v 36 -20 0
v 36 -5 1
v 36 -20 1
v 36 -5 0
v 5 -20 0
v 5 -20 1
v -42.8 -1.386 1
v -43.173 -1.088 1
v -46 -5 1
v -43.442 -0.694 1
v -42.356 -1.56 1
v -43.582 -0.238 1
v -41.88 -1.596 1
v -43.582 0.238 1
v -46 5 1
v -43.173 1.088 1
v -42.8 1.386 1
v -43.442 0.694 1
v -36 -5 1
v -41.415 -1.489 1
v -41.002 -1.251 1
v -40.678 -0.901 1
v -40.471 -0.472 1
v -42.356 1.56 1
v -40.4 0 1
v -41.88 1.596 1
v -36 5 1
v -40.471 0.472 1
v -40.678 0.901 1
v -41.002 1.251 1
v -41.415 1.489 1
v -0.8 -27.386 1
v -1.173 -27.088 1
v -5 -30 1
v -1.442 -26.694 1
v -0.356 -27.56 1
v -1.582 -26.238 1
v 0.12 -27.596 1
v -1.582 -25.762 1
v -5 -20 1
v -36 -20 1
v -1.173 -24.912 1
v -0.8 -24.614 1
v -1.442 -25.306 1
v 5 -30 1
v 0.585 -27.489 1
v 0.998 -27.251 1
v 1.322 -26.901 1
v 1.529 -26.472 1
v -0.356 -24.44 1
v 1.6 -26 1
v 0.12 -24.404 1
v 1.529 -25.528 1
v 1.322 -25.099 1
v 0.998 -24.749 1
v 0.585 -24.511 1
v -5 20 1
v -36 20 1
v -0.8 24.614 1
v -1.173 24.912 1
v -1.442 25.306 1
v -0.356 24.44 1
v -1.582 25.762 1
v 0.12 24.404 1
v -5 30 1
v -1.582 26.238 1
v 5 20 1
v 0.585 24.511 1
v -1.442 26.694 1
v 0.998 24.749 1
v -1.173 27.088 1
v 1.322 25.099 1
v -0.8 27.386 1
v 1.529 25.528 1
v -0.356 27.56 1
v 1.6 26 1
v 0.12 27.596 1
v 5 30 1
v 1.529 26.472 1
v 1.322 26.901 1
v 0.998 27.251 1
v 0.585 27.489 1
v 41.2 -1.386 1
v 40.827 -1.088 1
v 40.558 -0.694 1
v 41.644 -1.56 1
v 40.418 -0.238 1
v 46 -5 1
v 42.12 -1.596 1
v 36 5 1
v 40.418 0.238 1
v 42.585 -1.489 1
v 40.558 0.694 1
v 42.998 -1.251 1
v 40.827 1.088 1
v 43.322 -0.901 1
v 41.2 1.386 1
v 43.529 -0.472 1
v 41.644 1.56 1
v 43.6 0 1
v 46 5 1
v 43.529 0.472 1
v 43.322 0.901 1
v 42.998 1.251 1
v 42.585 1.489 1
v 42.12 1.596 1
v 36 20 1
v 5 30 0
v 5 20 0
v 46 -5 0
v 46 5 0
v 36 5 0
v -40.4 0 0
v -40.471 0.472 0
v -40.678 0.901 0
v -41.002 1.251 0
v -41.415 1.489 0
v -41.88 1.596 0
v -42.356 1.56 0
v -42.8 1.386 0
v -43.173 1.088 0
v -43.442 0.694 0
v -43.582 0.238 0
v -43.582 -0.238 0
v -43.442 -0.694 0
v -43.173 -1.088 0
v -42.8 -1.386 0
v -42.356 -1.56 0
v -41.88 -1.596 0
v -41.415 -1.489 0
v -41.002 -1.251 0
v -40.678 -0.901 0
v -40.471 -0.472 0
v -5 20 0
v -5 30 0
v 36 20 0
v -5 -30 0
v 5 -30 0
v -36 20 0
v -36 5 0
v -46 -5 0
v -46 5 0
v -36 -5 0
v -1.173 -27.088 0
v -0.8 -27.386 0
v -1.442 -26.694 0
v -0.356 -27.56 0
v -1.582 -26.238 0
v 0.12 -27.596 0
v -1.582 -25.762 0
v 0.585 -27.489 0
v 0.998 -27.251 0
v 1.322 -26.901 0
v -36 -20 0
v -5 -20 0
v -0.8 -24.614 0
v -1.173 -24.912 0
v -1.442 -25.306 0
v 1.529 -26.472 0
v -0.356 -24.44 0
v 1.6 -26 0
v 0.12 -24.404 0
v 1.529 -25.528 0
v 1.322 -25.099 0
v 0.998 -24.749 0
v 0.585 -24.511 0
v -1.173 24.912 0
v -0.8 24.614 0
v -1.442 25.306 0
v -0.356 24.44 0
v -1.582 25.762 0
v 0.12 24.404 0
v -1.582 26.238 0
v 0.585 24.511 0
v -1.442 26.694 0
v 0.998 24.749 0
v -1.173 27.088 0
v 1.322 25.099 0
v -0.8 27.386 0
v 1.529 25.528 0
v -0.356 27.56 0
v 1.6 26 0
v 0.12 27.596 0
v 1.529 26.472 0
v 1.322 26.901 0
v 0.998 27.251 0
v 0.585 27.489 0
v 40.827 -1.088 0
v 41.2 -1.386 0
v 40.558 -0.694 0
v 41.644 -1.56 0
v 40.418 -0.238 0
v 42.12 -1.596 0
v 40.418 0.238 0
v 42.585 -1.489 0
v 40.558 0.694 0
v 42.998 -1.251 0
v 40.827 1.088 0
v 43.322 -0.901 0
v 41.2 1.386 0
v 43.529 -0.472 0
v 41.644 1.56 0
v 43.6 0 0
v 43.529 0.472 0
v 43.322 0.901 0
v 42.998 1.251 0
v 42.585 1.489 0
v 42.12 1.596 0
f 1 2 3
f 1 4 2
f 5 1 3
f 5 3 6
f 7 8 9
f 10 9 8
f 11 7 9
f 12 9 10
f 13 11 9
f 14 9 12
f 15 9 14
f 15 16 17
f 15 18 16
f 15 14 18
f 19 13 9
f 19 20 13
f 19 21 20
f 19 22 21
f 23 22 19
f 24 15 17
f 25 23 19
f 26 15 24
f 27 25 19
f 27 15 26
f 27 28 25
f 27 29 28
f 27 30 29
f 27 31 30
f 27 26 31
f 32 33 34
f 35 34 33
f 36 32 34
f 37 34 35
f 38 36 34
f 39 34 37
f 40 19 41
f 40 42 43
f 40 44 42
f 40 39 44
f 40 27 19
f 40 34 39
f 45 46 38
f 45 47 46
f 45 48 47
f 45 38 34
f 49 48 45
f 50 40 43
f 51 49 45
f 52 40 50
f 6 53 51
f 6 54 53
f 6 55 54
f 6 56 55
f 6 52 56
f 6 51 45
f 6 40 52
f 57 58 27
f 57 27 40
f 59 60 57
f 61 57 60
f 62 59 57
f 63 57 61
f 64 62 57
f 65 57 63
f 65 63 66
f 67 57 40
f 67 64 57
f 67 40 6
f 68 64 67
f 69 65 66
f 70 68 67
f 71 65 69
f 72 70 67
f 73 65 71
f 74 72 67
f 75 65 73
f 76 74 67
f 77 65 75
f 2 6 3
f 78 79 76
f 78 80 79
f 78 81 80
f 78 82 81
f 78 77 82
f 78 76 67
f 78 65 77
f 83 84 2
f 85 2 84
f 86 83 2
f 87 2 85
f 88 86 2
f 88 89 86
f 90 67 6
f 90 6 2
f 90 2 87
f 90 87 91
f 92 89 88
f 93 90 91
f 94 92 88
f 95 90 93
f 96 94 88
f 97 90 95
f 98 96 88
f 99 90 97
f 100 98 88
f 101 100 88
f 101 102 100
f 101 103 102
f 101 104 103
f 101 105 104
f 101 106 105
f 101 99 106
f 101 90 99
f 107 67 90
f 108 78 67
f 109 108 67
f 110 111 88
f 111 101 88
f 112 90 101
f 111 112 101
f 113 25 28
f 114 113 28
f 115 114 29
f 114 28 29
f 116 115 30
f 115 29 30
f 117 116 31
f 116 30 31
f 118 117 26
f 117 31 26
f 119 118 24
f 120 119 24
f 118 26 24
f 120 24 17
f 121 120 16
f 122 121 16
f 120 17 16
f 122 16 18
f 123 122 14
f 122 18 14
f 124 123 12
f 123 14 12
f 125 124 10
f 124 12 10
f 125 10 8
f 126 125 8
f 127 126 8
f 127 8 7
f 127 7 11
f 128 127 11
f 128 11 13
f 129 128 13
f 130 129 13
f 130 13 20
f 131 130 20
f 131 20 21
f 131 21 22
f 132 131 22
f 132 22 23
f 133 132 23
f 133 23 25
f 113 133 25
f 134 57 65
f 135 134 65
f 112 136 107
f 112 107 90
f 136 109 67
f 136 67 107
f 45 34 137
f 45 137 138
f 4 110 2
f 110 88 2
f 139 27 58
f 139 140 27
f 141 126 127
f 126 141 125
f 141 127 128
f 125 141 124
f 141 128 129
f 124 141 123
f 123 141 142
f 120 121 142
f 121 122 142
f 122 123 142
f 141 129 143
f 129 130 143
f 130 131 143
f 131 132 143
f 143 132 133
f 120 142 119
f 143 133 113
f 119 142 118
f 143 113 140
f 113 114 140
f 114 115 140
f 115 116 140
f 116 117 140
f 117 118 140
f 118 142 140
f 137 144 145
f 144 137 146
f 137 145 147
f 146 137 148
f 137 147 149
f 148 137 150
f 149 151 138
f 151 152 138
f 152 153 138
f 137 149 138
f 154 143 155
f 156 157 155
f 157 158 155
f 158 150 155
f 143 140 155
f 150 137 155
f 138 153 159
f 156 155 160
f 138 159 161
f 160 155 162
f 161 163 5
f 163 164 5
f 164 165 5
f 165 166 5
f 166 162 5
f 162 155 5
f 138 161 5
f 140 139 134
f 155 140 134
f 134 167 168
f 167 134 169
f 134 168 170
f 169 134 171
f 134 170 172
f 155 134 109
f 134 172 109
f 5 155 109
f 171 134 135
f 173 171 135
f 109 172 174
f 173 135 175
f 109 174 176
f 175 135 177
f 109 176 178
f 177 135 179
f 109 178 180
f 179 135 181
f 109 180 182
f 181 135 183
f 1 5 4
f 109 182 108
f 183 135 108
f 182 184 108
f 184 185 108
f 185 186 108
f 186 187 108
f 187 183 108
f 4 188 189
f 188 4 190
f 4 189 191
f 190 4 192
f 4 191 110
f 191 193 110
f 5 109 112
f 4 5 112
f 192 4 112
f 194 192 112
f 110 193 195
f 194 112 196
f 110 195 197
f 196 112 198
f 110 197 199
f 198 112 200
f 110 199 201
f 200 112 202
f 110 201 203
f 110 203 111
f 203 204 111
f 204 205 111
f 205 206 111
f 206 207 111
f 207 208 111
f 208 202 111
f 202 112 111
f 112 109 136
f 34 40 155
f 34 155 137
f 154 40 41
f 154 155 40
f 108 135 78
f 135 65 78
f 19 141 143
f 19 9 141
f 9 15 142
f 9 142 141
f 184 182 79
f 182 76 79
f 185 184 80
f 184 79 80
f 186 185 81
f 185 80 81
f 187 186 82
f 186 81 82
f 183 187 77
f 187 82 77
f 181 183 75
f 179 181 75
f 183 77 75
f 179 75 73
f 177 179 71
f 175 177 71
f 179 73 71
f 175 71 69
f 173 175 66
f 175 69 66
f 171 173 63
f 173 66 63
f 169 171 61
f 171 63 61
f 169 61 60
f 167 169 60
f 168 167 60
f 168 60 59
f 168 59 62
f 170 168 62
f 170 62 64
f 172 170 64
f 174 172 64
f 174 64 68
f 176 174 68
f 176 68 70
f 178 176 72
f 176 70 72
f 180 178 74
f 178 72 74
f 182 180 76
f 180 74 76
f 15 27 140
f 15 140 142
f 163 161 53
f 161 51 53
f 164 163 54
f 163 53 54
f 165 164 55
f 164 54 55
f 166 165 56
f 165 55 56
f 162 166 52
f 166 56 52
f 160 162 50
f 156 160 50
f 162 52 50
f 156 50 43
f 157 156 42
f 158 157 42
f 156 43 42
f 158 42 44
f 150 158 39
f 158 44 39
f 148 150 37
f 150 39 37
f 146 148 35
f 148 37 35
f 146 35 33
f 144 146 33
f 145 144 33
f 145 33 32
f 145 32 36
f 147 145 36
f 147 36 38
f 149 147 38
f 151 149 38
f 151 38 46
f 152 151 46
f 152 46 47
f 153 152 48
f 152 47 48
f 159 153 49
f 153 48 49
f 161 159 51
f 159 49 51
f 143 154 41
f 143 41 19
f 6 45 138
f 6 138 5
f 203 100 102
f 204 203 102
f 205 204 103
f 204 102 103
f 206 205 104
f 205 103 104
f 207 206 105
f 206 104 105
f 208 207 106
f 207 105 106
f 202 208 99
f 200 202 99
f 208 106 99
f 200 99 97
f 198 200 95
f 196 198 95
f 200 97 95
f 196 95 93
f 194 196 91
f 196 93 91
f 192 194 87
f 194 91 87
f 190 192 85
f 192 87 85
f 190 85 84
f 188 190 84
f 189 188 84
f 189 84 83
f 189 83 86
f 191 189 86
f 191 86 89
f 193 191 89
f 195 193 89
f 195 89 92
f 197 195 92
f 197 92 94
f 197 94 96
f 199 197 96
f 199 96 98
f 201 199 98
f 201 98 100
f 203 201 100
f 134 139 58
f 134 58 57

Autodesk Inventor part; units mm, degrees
ref_plane "YZ Plane" through (0, 0, 0) normal (1, 0, 0) x (0, 1, 0)
ref_plane "XZ Plane" through (0, 0, 0) normal (0, 1, 0) x (-1, 0, 0)
ref_plane "XY Plane" through (0, 0, 0) normal (0, 0, 1) x (1, 0, 0)
sketch "Sketch1" plane through (0, 0, 0) normal (0, 0, 1) x (1, 0, 0)
  line L0 (-36, 20) -> (36, 20)
  line L1 (36, 20) -> (36, -20)
  line L2 (36, -20) -> (-36, -20)
  line L3 (-36, -20) -> (-36, 20)
  line L4 (-36, 20) -> (36, -20) construction
  line L5 (36, 20) -> (-36, -20) construction
  point P0 (0, 0)
  dimension "d0" = 40
  dimension "d1" = 72
sketch "Sketch2" plane through (0, 0, 1) normal (0, 0, 1) x (1, 0, 0)
  line L0 (-36, 20) -> (36, 20)
  line L1 (-46, -5) -> (-36, -5)
  line L2 (-36, -5) -> (-36, 5)
  line L3 (-36, 5) -> (-46, 5)
  line L4 (-46, 5) -> (-46, -5)
  line L5 (-46, -5) -> (-36, 5) construction
  line L6 (-36, -5) -> (-46, 5) construction
  line L7 (0, 0) -> (0, 7.0571)
  line L8 (0, 0) -> (6.6312, 0)
  line L9 (-36, -20) -> (-36, 20)
  line L10 (46, -5) -> (36, -5)
  line L11 (36, -5) -> (36, 5)
  line L12 (36, 5) -> (46, 5)
  line L13 (46, 5) -> (46, -5)
  line L14 (46, -5) -> (36, 5) construction
  line L15 (36, -5) -> (46, 5) construction
  circle A0 centre (-42, 0) radius 1.6
  circle A1 centre (42, 0) radius 1.6
  line L16 (36, -20) -> (-36, -20)
  line L17 (-5, -30) -> (5, -30)
  line L18 (5, -30) -> (5, -20)
  line L19 (5, -20) -> (-5, -20)
  line L20 (-5, -20) -> (-5, -30)
  line L21 (-5, -30) -> (5, -20) construction
  line L22 (5, -30) -> (-5, -20) construction
  circle A2 centre (0, -26) radius 1.6
  line L23 (-5, 30) -> (5, 30)
  line L24 (5, 30) -> (5, 20)
  line L25 (5, 20) -> (-5, 20)
  line L26 (-5, 20) -> (-5, 30)
  line L27 (-5, 30) -> (5, 20) construction
  line L28 (5, 30) -> (-5, 20) construction
  circle A3 centre (0, 26) radius 1.6
  point P0 (-41, 0)
  point P1 (41, 0)
  point P2 (0, -25)
  point P3 (0, 25)
  dimension "d5" = 10
  dimension "d6" = 10
  dimension "d10" = 3.2
  dimension "d12" = 4
  dimension "d18" = 3.2
  dimension "d19" = 10
  dimension "d20" = 10
  dimension "d21" = 4
extrude "Plate1" add sketch "Sketch1" along normal blind 1
sheet face with bend "Face2" sketch "Sketch2" thickness 1 toward (0, 0, -1) bend radius 1
bend "Bend1"
equation "\"d2\" = 厚度"
equation "\"d13\" = 折彎半徑"
equation "\"d14\" = 折彎離隙寬度"
equation "\"d16\" = 最小剩餘"
equation "\"d15\" = 折彎離隙深度"
equation "\"d17\" = 轉移半徑"
equation "\"折彎半徑\" = 厚度"
equation "\"折彎離隙寬度\" = 厚度"
equation "\"折彎離隙深度\" = 0.5 * 厚度"
equation "\"轉角離隙大小\" = 4 * 厚度"
equation "\"最小剩餘\" = 2 * 厚度"
equation "\"轉移半徑\" = 折彎半徑"
equation "\"Jacobi半徑大小\" = 折彎半徑"
equation "\"間隙大小\" = 厚度"
equation "\"厚度\" = 1"
properties part number "battery_box_5V_base" material "Aluminum"
